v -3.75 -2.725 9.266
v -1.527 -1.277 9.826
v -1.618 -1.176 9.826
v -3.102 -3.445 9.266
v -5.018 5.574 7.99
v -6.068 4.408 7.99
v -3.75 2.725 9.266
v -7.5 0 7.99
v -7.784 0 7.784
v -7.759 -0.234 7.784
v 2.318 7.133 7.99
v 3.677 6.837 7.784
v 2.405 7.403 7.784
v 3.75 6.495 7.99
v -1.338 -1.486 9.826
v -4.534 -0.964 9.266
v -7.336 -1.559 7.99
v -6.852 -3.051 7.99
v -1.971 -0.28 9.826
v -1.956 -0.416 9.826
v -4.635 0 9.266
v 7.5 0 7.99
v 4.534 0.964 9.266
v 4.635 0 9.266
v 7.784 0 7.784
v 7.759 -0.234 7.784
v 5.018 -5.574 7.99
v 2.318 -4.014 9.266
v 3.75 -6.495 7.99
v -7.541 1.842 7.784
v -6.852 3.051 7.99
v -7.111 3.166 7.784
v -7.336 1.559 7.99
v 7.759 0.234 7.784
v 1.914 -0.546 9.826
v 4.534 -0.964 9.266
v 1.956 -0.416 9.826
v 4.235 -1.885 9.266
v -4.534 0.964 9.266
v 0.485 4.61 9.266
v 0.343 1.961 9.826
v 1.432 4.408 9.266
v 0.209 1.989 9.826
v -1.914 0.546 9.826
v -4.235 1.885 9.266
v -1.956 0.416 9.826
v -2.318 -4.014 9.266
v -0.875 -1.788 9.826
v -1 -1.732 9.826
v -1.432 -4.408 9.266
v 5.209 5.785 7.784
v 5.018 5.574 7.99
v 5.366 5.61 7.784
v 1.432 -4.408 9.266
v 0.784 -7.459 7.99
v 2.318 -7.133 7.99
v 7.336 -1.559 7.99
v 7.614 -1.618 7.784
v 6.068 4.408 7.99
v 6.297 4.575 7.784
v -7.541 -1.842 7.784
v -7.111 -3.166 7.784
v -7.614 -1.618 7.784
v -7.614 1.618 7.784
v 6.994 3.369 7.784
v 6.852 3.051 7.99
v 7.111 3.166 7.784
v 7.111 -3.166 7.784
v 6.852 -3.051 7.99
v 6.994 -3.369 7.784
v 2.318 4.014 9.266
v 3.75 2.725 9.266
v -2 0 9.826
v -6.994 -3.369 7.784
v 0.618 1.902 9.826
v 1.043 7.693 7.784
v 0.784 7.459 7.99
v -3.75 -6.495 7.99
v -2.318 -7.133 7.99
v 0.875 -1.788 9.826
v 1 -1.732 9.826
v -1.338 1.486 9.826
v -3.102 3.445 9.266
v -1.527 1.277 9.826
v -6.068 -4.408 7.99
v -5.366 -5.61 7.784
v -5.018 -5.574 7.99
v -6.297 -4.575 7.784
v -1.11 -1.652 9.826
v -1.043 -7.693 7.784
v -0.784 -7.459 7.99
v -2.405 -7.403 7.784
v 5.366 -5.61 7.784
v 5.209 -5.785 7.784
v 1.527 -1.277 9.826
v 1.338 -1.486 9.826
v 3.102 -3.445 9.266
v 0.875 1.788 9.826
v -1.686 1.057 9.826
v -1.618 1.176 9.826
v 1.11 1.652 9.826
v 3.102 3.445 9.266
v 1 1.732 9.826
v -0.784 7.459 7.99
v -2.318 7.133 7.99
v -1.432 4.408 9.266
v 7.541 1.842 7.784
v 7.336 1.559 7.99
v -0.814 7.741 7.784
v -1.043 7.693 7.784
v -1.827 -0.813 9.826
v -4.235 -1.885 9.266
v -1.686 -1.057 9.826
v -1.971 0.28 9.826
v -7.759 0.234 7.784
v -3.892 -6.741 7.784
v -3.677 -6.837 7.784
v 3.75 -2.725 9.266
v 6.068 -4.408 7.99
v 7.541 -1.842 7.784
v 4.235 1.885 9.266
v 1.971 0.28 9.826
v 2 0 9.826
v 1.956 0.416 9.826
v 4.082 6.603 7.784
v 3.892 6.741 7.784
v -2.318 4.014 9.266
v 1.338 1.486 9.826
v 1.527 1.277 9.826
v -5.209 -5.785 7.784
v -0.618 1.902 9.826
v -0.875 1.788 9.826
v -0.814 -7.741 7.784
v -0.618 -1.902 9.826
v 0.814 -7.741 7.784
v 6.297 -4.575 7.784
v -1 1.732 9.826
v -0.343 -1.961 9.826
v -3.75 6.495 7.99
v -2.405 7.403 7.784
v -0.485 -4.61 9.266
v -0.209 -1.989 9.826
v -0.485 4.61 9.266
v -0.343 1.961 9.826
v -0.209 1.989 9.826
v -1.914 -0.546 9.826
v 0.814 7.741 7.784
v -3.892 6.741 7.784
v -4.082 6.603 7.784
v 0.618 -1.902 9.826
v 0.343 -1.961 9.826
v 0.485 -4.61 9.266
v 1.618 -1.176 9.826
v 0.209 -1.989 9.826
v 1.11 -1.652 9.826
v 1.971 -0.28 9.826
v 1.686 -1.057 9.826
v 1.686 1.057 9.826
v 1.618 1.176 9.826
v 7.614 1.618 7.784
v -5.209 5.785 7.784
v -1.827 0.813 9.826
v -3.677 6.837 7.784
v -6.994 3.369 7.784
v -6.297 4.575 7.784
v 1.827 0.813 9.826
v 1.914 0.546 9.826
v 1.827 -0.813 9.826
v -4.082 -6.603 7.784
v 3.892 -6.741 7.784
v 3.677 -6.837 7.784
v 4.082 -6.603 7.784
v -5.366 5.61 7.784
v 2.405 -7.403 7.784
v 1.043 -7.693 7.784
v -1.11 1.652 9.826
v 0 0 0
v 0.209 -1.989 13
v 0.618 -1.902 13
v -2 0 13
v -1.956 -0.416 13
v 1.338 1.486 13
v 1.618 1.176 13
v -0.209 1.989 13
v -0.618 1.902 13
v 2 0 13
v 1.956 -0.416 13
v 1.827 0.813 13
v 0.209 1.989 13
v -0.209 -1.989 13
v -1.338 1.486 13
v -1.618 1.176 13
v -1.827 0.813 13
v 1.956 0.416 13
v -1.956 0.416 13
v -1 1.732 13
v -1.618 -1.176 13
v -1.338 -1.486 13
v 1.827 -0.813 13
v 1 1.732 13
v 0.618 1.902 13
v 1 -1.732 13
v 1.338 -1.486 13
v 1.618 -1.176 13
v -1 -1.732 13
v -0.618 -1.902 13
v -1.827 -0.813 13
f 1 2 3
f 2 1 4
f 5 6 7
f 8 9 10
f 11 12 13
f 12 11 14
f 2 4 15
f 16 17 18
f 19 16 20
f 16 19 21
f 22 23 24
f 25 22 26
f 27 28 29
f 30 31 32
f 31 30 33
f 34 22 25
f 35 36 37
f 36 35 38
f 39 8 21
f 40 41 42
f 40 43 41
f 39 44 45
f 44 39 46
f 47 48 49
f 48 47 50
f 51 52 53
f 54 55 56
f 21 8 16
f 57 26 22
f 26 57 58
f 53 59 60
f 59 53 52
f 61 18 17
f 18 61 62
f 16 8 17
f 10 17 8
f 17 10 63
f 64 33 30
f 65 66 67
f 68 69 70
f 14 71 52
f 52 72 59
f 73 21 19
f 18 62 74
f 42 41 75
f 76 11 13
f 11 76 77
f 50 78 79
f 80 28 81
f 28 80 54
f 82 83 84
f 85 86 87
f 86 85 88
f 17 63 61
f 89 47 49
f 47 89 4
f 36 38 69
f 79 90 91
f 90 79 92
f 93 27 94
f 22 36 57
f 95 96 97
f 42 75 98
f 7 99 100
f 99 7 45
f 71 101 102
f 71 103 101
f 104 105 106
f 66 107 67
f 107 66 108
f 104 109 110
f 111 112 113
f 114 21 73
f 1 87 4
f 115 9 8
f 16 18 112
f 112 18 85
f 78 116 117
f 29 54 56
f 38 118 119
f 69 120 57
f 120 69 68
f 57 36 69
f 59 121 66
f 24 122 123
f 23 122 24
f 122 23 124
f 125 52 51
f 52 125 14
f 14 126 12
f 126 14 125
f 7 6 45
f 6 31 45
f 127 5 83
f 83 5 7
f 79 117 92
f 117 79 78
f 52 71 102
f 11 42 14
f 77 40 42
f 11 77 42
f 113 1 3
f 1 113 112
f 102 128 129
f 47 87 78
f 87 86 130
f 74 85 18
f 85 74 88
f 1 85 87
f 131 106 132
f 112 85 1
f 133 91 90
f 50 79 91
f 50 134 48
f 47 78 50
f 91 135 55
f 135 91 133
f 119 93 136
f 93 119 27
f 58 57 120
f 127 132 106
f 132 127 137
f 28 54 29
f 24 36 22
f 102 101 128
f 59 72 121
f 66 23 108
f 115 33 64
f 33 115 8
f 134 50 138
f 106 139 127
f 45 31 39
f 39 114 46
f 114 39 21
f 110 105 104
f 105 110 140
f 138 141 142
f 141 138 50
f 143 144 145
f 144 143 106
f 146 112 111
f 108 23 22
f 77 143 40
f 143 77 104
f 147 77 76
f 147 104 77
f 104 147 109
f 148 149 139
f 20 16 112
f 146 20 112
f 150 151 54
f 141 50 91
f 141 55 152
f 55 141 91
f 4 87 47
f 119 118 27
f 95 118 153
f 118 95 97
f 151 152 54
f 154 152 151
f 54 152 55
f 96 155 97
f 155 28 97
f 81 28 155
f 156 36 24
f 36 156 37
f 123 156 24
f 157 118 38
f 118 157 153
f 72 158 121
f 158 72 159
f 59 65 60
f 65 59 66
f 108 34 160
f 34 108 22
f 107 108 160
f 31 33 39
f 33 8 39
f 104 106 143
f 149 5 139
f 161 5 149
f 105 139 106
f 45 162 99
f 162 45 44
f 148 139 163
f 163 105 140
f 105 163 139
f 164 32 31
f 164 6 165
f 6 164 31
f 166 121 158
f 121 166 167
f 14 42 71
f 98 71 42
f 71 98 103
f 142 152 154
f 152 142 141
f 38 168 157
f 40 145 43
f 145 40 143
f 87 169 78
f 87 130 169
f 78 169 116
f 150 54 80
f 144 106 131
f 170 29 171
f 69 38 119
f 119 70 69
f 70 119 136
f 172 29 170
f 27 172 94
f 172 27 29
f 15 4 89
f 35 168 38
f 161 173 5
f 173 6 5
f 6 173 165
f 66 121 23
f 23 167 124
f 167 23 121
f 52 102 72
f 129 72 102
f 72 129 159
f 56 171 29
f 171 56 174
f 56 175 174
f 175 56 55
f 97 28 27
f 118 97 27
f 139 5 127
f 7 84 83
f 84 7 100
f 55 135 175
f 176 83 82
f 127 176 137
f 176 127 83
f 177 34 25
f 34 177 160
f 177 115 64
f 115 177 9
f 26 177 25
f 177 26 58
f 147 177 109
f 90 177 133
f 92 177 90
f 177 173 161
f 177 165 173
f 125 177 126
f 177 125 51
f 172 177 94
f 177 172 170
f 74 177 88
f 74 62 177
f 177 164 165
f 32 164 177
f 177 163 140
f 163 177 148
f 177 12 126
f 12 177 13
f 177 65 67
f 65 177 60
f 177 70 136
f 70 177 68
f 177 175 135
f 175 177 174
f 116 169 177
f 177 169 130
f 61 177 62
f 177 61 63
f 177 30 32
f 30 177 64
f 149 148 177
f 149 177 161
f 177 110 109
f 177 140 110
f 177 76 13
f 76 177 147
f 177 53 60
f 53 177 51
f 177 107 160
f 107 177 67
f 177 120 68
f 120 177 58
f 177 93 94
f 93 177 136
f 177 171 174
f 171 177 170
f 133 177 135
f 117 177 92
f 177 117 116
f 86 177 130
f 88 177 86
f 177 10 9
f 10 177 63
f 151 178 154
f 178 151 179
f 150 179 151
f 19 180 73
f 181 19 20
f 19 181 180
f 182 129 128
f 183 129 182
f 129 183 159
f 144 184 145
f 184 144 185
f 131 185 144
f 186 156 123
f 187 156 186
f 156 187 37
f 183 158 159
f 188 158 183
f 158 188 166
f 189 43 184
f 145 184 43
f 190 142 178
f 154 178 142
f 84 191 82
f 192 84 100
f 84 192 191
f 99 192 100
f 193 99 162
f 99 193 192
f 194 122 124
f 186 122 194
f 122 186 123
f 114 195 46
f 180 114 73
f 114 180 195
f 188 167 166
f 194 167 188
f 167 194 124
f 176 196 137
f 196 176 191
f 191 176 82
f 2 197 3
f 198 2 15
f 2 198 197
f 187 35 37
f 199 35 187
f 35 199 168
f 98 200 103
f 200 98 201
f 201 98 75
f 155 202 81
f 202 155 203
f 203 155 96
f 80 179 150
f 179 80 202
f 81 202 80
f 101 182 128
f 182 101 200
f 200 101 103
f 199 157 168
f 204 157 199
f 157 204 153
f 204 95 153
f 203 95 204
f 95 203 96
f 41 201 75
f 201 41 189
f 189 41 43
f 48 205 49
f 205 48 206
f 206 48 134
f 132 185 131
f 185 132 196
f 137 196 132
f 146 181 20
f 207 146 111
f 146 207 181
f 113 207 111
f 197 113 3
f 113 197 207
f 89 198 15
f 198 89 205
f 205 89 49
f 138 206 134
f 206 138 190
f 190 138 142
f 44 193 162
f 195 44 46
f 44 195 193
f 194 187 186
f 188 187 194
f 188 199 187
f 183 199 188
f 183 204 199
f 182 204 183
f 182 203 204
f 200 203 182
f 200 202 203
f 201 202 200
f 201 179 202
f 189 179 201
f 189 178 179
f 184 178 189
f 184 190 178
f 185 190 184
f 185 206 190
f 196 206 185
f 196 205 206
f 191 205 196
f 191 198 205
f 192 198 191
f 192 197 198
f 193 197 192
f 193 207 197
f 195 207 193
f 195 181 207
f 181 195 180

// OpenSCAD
// 3D Shapes- Design Time: Top

$fn = 30;
intersection() {
  translate([0, 0, -5]) sphere(15);
  cylinder(h=10, r1=0, r2=10);
}
translate([0, 0, 8]) cylinder(h=5, r1=2, r2=2);
